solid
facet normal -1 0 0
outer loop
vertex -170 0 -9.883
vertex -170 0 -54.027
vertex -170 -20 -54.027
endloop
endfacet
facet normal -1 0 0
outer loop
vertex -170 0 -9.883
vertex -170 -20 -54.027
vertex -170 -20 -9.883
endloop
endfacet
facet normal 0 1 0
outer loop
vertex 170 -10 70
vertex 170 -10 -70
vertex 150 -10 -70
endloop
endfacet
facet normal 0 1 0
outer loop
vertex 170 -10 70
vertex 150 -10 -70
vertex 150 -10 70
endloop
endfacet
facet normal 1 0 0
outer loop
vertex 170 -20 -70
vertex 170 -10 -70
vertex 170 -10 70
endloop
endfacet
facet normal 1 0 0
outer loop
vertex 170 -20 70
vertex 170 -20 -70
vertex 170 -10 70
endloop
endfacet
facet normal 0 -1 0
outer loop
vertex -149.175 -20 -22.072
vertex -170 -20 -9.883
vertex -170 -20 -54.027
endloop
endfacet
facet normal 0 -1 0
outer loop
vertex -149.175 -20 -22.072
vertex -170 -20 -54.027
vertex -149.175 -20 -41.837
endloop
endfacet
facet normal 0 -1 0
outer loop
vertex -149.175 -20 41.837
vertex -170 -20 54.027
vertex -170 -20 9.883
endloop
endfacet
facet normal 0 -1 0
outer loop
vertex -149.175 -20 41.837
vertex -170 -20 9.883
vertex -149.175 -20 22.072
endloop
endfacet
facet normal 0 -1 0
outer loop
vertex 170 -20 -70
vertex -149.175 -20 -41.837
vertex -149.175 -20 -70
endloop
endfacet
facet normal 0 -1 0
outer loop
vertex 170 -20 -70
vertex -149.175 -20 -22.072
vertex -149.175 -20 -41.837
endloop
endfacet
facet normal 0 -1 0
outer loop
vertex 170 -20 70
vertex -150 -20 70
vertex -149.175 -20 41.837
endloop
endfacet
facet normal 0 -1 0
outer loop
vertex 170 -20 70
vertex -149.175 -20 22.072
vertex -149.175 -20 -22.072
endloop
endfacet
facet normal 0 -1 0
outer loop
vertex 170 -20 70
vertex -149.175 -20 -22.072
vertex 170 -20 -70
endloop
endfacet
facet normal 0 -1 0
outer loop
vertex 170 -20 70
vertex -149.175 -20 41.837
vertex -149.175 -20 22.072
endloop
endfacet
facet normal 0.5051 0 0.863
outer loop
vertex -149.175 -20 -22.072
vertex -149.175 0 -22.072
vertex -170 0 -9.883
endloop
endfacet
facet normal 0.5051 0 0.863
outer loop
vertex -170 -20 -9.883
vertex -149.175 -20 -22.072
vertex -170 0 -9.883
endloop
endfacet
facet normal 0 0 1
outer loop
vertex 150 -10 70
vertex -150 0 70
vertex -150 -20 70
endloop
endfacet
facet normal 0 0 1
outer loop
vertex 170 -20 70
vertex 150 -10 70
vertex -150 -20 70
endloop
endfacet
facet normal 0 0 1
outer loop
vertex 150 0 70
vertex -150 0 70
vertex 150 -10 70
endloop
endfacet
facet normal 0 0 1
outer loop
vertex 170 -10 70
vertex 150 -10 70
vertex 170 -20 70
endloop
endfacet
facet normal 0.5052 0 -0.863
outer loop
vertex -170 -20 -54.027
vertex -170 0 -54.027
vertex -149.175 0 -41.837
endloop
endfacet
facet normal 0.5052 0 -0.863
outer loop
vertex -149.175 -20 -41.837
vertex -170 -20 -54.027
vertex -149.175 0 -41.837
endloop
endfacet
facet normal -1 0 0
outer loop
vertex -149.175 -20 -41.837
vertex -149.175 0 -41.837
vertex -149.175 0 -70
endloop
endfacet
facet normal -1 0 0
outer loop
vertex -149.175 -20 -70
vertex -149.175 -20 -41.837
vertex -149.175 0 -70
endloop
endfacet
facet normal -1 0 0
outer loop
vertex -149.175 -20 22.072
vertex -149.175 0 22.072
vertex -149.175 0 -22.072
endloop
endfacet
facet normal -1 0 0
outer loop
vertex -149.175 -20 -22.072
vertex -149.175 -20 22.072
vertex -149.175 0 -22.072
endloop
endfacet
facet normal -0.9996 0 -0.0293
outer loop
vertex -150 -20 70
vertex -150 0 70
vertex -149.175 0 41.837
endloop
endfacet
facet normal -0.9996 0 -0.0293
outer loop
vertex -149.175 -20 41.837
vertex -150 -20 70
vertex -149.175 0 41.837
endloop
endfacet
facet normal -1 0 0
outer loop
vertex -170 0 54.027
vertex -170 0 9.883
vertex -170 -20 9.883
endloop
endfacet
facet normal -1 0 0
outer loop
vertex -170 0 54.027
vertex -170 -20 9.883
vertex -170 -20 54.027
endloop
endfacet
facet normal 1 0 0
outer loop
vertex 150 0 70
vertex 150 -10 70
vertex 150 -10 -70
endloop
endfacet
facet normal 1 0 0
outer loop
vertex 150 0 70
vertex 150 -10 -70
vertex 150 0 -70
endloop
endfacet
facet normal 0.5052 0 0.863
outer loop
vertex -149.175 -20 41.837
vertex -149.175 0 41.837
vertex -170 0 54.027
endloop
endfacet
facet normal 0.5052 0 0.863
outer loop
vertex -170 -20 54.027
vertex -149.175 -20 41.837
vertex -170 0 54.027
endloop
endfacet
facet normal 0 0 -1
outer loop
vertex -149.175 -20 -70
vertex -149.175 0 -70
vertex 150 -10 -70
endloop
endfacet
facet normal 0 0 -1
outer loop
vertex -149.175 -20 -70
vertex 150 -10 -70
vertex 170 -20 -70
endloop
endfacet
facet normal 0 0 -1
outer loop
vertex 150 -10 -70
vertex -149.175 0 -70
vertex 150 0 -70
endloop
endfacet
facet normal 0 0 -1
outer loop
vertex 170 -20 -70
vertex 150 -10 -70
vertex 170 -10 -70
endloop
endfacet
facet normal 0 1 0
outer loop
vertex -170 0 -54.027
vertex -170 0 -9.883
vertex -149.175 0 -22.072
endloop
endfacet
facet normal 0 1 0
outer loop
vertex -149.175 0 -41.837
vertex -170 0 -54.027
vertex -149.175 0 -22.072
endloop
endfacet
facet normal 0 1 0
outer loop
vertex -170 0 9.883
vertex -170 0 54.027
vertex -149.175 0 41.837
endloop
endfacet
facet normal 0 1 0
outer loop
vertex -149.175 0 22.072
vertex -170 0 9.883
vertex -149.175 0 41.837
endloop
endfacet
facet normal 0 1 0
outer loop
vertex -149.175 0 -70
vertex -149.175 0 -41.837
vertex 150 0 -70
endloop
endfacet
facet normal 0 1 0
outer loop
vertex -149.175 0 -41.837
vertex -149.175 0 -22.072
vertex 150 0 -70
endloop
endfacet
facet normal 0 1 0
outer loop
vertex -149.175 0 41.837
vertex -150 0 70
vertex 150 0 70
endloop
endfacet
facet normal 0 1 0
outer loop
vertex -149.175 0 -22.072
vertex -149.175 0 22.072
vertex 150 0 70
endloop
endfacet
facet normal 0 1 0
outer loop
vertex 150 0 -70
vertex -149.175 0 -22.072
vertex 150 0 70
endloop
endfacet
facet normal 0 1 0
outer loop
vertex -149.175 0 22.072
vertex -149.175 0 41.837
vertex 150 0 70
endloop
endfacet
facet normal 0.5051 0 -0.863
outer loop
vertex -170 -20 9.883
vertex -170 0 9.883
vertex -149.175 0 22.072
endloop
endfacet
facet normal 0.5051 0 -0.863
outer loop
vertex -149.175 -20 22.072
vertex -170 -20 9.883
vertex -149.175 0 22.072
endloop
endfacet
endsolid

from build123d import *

# Parameters (mm, degrees)
F0_W     = 340
F0_H     = 140
F1_DEPTH = 20
F4_DEPTH = 20
F2_W     = 10
F2_H     = 140
F5_DEPTH = 20


with BuildPart() as f1:
    # F0 (on Front) → F1 (new body)
    with BuildSketch(Plane.XZ):
        Rectangle(F0_W, F0_H)
    extrude(amount=F1_DEPTH)

    # F3 (on face) → F4 (cut)
    with BuildSketch(Plane(origin=(0, 0, 0), x_dir=(-1, 0, 0), z_dir=(0, 1, 0))):
        Polygon((149.1751, -41.837405), (149.1751, -70), (150, -70), (170, -70), (170, -54.026762), align=None)
        Polygon((170, 54.026762), (170, 70), (150, 70), (149.1751, 41.837405), align=None)
        Polygon((170, 0), (170, 9.882683), (149.1751, 22.07204), (149.1751, -22.07204), (170, -9.882683), align=None)
    extrude(amount=-F4_DEPTH, mode=Mode.SUBTRACT)

    # F2 (on face) → F5 (cut)
    with BuildSketch(Plane.YZ.offset(170)):
        with Locations((-5, 0)):
            Rectangle(F2_W, F2_H)
    extrude(amount=-F5_DEPTH, mode=Mode.SUBTRACT)


solid = f1.part
